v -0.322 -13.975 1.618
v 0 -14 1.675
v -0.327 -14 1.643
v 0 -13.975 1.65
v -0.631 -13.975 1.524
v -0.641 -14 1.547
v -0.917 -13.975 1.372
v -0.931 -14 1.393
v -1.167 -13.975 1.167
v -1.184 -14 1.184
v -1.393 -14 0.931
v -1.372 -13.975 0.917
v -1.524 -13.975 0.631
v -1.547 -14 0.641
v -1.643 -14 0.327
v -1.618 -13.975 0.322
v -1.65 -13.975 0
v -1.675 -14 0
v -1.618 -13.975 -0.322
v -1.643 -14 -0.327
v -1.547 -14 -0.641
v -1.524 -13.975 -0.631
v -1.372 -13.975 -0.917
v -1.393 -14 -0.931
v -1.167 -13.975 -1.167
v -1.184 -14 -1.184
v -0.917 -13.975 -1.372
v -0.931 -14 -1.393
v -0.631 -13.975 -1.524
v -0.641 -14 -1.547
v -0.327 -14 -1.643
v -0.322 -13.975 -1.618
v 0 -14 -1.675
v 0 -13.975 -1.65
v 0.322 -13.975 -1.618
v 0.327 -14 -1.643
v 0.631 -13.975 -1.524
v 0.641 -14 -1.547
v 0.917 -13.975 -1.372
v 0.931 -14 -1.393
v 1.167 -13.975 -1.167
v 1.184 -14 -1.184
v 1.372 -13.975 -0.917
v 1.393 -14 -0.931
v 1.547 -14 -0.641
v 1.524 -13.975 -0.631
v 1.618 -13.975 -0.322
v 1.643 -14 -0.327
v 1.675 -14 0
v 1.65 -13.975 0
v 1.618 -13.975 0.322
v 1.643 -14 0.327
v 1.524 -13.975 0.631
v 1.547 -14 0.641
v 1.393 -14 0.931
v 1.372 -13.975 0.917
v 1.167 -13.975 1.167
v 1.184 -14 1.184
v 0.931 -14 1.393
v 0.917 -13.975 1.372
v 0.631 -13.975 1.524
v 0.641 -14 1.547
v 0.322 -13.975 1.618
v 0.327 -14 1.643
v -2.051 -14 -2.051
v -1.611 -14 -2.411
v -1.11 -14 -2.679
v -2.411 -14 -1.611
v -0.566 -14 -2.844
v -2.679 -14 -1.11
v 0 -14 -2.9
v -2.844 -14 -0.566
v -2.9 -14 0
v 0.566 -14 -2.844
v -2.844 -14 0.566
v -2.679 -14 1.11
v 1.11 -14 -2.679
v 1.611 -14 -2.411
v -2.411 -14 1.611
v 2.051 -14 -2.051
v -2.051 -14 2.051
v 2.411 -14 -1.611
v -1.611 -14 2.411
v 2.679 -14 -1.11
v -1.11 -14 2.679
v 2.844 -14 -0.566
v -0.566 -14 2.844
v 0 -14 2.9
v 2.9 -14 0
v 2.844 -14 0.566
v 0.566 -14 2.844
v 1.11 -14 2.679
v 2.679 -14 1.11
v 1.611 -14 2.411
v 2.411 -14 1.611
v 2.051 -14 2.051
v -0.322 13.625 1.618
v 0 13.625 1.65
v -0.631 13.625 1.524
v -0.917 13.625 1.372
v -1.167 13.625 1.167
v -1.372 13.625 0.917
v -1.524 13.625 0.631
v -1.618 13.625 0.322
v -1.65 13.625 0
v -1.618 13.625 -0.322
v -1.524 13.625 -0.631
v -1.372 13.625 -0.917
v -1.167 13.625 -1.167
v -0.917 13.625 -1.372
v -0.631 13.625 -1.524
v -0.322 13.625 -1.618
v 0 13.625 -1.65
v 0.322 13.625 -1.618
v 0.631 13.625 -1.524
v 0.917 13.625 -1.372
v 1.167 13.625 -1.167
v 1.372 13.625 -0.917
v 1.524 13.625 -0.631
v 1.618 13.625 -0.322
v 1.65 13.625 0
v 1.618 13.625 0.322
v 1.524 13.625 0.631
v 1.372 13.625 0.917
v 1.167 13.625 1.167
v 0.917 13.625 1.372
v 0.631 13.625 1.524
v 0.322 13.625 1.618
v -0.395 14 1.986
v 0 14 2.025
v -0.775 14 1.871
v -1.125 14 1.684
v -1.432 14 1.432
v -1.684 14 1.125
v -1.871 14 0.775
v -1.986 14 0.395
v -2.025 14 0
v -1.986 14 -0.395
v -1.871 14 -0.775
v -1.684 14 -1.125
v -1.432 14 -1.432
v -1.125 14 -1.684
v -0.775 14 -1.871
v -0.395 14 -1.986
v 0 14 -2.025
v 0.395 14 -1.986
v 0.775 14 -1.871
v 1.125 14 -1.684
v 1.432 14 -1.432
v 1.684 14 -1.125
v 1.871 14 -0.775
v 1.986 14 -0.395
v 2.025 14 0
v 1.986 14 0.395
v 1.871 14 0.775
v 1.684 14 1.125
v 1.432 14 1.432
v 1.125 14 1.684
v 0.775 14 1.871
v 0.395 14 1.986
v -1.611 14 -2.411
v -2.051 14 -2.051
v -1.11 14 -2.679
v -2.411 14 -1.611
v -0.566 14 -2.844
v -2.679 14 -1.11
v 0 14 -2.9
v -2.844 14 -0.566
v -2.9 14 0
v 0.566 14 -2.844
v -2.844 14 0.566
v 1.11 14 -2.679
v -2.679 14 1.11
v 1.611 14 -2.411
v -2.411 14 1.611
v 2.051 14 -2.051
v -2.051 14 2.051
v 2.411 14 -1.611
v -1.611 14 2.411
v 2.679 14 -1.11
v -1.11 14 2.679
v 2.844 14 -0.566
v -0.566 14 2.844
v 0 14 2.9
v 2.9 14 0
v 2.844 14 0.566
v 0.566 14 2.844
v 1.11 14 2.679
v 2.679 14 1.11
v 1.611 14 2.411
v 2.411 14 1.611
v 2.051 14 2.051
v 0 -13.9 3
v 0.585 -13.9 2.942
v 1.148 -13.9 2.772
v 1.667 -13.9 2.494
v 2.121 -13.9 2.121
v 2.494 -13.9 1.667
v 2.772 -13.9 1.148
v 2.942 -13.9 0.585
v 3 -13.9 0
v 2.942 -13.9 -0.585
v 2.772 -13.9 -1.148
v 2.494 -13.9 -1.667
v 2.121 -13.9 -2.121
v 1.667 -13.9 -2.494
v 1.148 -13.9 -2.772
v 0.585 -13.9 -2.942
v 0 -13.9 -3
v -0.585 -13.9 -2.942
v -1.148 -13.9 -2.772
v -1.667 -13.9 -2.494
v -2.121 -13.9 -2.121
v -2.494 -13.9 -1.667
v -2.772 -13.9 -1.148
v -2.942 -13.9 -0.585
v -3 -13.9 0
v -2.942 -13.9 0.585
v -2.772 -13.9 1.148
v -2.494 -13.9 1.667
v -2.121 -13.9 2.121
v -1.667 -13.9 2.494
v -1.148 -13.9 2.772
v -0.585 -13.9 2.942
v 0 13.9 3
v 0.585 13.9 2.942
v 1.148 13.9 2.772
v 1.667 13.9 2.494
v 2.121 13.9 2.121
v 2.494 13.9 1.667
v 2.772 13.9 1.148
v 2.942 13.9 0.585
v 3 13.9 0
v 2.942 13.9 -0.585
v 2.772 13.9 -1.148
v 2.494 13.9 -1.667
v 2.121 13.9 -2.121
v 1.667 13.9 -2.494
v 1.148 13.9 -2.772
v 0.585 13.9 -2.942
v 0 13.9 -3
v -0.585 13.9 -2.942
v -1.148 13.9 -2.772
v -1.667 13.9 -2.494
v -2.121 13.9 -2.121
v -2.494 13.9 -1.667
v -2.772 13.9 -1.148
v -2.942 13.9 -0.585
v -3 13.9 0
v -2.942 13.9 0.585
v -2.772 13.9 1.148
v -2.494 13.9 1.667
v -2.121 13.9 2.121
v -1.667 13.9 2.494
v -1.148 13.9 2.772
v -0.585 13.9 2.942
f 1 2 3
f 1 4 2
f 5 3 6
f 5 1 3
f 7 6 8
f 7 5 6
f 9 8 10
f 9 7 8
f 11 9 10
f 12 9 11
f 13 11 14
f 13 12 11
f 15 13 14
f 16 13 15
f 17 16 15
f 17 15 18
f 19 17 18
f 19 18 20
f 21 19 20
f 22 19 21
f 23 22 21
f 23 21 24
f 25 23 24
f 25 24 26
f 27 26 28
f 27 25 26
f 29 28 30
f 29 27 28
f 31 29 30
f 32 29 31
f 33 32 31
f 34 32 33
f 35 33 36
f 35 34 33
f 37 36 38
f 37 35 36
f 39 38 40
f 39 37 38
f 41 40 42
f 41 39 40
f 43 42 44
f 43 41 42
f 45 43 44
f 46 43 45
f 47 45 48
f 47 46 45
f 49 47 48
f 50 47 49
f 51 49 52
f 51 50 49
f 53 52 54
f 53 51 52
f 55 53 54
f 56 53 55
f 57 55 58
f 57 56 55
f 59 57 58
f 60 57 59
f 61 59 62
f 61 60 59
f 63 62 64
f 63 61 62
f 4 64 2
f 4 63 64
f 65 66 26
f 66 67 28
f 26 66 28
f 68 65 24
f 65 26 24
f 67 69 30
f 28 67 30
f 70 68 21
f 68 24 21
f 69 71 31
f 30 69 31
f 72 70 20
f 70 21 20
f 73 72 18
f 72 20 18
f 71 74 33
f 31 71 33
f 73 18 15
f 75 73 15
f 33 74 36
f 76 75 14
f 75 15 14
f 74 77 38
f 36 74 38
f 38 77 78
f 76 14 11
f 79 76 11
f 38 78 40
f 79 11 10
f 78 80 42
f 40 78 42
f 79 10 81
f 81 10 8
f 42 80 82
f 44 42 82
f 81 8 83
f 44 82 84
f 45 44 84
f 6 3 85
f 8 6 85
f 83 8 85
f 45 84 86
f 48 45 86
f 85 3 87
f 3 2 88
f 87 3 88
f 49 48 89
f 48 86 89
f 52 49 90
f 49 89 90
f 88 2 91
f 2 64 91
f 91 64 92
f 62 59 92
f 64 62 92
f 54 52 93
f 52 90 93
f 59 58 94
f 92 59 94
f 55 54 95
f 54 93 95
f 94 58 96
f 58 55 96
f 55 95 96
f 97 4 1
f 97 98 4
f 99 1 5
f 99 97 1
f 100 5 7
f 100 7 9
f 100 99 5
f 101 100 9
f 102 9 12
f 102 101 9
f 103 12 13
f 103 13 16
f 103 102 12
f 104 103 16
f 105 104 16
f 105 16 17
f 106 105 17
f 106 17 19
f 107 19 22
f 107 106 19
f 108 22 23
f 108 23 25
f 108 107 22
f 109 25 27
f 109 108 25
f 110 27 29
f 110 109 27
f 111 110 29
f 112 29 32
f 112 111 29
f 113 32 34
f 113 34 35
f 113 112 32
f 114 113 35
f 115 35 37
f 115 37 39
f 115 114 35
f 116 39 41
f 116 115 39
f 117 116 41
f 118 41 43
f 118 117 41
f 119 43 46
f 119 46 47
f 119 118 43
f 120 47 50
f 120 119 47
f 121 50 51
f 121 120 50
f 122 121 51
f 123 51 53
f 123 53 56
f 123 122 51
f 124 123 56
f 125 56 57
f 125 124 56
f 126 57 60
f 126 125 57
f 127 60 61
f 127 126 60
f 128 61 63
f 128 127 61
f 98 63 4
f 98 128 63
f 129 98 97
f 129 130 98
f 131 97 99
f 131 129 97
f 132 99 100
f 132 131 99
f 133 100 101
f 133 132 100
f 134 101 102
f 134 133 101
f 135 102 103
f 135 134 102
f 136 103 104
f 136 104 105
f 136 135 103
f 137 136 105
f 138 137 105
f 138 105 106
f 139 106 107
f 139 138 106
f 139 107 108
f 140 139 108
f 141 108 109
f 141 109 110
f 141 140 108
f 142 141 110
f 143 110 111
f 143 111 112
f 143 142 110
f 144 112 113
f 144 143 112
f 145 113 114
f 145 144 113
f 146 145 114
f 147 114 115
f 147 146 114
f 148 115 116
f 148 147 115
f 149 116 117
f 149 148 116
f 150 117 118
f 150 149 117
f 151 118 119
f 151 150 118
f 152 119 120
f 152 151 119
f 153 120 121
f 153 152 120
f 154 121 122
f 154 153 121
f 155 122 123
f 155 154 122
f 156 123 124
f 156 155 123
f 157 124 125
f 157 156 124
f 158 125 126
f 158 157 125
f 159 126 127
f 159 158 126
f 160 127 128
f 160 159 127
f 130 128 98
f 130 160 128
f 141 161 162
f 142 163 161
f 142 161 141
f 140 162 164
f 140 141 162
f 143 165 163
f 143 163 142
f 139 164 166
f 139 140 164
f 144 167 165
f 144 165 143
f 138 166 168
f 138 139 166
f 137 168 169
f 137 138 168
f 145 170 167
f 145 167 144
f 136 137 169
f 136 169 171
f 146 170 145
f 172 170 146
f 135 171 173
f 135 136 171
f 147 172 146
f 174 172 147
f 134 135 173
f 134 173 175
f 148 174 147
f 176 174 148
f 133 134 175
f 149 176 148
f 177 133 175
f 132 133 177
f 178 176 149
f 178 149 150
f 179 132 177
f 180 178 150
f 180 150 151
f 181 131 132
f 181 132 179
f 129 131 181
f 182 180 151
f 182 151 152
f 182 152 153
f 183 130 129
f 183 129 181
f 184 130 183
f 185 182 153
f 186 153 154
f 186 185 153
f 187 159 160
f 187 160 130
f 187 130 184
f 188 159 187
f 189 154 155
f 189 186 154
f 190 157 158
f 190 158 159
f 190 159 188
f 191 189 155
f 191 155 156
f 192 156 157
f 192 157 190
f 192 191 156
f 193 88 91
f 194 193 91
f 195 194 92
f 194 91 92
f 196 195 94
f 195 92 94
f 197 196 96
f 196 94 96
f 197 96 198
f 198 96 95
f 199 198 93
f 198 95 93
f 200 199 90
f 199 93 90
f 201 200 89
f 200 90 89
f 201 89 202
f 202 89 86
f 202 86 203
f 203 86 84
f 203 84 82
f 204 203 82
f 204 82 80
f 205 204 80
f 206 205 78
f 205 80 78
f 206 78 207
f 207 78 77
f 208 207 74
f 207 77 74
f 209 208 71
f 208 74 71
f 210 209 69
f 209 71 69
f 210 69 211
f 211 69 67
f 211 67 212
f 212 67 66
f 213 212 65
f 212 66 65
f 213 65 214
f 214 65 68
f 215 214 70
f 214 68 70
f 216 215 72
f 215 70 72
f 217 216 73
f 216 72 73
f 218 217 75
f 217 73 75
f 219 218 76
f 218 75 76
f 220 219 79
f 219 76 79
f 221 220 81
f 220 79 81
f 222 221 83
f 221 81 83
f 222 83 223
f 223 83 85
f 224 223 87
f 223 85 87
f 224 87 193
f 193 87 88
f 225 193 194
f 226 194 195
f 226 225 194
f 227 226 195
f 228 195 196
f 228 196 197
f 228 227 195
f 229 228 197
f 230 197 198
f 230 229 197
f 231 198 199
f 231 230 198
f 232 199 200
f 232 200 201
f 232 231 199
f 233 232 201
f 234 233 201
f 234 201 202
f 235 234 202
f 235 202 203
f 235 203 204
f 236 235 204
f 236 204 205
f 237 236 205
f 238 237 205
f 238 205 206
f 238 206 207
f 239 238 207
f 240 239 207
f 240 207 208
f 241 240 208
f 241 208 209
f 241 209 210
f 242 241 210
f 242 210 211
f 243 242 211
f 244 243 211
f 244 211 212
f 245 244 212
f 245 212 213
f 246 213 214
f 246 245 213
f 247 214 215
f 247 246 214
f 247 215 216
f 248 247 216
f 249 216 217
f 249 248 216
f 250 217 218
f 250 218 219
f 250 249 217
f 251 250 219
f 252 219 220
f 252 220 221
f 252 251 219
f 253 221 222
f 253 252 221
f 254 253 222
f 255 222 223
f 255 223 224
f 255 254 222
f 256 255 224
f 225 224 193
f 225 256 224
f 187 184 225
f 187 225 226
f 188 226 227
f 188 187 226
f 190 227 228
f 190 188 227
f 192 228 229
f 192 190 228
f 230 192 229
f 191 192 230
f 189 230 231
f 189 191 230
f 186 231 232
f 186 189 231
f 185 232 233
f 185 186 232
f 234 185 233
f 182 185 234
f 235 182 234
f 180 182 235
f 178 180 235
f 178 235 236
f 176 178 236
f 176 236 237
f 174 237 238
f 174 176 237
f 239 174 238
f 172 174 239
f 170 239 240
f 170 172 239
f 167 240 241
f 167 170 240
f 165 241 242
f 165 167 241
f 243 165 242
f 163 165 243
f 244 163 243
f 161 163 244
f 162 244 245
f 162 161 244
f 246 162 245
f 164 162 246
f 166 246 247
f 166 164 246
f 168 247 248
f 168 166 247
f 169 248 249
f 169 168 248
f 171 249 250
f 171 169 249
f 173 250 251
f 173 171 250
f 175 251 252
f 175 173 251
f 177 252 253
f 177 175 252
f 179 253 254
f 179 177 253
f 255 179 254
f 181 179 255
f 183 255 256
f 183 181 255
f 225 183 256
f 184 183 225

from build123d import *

# Parameters (mm, degrees)
SKETCH_1_R      = 3
EXTRUDE_1_DEPTH = 14
CHAMFER_1_SIZE  = 0.1


with BuildPart() as part:
    # 草图1 → 凸台-拉伸1 (new, symmetric)
    with BuildSketch(Plane(origin=(0, 0, 0), x_dir=(1, 0, 0), z_dir=(0, 1, 0))):
        with Locations(Location((0, 0, 0), (0, 0, 270))):
            Circle(SKETCH_1_R)
    extrude(amount=EXTRUDE_1_DEPTH, both=True)

    # 草图3 → M4 Tapped Hole1 (revolve, cut)
    with BuildSketch(Plane(origin=(0, 14, 0), x_dir=(0, 0, 1), z_dir=(1, 0, 0))):
        Polygon((0, 0), (0, 28), (1.675, 28), (1.65, 27.975), (1.65, 0.375), (2.025, 0), align=None)
    revolve(axis=Axis((0, 20.35, 0), (0, -1, 0)), mode=Mode.SUBTRACT)

    # 倒角1
    chamfer_1_edges = [part.edges().sort_by_distance(p)[0] for p in [
        (0, -14, -3),
        (0, 14, -3),
    ]]
    chamfer(chamfer_1_edges, length=CHAMFER_1_SIZE)


solid = part.part
